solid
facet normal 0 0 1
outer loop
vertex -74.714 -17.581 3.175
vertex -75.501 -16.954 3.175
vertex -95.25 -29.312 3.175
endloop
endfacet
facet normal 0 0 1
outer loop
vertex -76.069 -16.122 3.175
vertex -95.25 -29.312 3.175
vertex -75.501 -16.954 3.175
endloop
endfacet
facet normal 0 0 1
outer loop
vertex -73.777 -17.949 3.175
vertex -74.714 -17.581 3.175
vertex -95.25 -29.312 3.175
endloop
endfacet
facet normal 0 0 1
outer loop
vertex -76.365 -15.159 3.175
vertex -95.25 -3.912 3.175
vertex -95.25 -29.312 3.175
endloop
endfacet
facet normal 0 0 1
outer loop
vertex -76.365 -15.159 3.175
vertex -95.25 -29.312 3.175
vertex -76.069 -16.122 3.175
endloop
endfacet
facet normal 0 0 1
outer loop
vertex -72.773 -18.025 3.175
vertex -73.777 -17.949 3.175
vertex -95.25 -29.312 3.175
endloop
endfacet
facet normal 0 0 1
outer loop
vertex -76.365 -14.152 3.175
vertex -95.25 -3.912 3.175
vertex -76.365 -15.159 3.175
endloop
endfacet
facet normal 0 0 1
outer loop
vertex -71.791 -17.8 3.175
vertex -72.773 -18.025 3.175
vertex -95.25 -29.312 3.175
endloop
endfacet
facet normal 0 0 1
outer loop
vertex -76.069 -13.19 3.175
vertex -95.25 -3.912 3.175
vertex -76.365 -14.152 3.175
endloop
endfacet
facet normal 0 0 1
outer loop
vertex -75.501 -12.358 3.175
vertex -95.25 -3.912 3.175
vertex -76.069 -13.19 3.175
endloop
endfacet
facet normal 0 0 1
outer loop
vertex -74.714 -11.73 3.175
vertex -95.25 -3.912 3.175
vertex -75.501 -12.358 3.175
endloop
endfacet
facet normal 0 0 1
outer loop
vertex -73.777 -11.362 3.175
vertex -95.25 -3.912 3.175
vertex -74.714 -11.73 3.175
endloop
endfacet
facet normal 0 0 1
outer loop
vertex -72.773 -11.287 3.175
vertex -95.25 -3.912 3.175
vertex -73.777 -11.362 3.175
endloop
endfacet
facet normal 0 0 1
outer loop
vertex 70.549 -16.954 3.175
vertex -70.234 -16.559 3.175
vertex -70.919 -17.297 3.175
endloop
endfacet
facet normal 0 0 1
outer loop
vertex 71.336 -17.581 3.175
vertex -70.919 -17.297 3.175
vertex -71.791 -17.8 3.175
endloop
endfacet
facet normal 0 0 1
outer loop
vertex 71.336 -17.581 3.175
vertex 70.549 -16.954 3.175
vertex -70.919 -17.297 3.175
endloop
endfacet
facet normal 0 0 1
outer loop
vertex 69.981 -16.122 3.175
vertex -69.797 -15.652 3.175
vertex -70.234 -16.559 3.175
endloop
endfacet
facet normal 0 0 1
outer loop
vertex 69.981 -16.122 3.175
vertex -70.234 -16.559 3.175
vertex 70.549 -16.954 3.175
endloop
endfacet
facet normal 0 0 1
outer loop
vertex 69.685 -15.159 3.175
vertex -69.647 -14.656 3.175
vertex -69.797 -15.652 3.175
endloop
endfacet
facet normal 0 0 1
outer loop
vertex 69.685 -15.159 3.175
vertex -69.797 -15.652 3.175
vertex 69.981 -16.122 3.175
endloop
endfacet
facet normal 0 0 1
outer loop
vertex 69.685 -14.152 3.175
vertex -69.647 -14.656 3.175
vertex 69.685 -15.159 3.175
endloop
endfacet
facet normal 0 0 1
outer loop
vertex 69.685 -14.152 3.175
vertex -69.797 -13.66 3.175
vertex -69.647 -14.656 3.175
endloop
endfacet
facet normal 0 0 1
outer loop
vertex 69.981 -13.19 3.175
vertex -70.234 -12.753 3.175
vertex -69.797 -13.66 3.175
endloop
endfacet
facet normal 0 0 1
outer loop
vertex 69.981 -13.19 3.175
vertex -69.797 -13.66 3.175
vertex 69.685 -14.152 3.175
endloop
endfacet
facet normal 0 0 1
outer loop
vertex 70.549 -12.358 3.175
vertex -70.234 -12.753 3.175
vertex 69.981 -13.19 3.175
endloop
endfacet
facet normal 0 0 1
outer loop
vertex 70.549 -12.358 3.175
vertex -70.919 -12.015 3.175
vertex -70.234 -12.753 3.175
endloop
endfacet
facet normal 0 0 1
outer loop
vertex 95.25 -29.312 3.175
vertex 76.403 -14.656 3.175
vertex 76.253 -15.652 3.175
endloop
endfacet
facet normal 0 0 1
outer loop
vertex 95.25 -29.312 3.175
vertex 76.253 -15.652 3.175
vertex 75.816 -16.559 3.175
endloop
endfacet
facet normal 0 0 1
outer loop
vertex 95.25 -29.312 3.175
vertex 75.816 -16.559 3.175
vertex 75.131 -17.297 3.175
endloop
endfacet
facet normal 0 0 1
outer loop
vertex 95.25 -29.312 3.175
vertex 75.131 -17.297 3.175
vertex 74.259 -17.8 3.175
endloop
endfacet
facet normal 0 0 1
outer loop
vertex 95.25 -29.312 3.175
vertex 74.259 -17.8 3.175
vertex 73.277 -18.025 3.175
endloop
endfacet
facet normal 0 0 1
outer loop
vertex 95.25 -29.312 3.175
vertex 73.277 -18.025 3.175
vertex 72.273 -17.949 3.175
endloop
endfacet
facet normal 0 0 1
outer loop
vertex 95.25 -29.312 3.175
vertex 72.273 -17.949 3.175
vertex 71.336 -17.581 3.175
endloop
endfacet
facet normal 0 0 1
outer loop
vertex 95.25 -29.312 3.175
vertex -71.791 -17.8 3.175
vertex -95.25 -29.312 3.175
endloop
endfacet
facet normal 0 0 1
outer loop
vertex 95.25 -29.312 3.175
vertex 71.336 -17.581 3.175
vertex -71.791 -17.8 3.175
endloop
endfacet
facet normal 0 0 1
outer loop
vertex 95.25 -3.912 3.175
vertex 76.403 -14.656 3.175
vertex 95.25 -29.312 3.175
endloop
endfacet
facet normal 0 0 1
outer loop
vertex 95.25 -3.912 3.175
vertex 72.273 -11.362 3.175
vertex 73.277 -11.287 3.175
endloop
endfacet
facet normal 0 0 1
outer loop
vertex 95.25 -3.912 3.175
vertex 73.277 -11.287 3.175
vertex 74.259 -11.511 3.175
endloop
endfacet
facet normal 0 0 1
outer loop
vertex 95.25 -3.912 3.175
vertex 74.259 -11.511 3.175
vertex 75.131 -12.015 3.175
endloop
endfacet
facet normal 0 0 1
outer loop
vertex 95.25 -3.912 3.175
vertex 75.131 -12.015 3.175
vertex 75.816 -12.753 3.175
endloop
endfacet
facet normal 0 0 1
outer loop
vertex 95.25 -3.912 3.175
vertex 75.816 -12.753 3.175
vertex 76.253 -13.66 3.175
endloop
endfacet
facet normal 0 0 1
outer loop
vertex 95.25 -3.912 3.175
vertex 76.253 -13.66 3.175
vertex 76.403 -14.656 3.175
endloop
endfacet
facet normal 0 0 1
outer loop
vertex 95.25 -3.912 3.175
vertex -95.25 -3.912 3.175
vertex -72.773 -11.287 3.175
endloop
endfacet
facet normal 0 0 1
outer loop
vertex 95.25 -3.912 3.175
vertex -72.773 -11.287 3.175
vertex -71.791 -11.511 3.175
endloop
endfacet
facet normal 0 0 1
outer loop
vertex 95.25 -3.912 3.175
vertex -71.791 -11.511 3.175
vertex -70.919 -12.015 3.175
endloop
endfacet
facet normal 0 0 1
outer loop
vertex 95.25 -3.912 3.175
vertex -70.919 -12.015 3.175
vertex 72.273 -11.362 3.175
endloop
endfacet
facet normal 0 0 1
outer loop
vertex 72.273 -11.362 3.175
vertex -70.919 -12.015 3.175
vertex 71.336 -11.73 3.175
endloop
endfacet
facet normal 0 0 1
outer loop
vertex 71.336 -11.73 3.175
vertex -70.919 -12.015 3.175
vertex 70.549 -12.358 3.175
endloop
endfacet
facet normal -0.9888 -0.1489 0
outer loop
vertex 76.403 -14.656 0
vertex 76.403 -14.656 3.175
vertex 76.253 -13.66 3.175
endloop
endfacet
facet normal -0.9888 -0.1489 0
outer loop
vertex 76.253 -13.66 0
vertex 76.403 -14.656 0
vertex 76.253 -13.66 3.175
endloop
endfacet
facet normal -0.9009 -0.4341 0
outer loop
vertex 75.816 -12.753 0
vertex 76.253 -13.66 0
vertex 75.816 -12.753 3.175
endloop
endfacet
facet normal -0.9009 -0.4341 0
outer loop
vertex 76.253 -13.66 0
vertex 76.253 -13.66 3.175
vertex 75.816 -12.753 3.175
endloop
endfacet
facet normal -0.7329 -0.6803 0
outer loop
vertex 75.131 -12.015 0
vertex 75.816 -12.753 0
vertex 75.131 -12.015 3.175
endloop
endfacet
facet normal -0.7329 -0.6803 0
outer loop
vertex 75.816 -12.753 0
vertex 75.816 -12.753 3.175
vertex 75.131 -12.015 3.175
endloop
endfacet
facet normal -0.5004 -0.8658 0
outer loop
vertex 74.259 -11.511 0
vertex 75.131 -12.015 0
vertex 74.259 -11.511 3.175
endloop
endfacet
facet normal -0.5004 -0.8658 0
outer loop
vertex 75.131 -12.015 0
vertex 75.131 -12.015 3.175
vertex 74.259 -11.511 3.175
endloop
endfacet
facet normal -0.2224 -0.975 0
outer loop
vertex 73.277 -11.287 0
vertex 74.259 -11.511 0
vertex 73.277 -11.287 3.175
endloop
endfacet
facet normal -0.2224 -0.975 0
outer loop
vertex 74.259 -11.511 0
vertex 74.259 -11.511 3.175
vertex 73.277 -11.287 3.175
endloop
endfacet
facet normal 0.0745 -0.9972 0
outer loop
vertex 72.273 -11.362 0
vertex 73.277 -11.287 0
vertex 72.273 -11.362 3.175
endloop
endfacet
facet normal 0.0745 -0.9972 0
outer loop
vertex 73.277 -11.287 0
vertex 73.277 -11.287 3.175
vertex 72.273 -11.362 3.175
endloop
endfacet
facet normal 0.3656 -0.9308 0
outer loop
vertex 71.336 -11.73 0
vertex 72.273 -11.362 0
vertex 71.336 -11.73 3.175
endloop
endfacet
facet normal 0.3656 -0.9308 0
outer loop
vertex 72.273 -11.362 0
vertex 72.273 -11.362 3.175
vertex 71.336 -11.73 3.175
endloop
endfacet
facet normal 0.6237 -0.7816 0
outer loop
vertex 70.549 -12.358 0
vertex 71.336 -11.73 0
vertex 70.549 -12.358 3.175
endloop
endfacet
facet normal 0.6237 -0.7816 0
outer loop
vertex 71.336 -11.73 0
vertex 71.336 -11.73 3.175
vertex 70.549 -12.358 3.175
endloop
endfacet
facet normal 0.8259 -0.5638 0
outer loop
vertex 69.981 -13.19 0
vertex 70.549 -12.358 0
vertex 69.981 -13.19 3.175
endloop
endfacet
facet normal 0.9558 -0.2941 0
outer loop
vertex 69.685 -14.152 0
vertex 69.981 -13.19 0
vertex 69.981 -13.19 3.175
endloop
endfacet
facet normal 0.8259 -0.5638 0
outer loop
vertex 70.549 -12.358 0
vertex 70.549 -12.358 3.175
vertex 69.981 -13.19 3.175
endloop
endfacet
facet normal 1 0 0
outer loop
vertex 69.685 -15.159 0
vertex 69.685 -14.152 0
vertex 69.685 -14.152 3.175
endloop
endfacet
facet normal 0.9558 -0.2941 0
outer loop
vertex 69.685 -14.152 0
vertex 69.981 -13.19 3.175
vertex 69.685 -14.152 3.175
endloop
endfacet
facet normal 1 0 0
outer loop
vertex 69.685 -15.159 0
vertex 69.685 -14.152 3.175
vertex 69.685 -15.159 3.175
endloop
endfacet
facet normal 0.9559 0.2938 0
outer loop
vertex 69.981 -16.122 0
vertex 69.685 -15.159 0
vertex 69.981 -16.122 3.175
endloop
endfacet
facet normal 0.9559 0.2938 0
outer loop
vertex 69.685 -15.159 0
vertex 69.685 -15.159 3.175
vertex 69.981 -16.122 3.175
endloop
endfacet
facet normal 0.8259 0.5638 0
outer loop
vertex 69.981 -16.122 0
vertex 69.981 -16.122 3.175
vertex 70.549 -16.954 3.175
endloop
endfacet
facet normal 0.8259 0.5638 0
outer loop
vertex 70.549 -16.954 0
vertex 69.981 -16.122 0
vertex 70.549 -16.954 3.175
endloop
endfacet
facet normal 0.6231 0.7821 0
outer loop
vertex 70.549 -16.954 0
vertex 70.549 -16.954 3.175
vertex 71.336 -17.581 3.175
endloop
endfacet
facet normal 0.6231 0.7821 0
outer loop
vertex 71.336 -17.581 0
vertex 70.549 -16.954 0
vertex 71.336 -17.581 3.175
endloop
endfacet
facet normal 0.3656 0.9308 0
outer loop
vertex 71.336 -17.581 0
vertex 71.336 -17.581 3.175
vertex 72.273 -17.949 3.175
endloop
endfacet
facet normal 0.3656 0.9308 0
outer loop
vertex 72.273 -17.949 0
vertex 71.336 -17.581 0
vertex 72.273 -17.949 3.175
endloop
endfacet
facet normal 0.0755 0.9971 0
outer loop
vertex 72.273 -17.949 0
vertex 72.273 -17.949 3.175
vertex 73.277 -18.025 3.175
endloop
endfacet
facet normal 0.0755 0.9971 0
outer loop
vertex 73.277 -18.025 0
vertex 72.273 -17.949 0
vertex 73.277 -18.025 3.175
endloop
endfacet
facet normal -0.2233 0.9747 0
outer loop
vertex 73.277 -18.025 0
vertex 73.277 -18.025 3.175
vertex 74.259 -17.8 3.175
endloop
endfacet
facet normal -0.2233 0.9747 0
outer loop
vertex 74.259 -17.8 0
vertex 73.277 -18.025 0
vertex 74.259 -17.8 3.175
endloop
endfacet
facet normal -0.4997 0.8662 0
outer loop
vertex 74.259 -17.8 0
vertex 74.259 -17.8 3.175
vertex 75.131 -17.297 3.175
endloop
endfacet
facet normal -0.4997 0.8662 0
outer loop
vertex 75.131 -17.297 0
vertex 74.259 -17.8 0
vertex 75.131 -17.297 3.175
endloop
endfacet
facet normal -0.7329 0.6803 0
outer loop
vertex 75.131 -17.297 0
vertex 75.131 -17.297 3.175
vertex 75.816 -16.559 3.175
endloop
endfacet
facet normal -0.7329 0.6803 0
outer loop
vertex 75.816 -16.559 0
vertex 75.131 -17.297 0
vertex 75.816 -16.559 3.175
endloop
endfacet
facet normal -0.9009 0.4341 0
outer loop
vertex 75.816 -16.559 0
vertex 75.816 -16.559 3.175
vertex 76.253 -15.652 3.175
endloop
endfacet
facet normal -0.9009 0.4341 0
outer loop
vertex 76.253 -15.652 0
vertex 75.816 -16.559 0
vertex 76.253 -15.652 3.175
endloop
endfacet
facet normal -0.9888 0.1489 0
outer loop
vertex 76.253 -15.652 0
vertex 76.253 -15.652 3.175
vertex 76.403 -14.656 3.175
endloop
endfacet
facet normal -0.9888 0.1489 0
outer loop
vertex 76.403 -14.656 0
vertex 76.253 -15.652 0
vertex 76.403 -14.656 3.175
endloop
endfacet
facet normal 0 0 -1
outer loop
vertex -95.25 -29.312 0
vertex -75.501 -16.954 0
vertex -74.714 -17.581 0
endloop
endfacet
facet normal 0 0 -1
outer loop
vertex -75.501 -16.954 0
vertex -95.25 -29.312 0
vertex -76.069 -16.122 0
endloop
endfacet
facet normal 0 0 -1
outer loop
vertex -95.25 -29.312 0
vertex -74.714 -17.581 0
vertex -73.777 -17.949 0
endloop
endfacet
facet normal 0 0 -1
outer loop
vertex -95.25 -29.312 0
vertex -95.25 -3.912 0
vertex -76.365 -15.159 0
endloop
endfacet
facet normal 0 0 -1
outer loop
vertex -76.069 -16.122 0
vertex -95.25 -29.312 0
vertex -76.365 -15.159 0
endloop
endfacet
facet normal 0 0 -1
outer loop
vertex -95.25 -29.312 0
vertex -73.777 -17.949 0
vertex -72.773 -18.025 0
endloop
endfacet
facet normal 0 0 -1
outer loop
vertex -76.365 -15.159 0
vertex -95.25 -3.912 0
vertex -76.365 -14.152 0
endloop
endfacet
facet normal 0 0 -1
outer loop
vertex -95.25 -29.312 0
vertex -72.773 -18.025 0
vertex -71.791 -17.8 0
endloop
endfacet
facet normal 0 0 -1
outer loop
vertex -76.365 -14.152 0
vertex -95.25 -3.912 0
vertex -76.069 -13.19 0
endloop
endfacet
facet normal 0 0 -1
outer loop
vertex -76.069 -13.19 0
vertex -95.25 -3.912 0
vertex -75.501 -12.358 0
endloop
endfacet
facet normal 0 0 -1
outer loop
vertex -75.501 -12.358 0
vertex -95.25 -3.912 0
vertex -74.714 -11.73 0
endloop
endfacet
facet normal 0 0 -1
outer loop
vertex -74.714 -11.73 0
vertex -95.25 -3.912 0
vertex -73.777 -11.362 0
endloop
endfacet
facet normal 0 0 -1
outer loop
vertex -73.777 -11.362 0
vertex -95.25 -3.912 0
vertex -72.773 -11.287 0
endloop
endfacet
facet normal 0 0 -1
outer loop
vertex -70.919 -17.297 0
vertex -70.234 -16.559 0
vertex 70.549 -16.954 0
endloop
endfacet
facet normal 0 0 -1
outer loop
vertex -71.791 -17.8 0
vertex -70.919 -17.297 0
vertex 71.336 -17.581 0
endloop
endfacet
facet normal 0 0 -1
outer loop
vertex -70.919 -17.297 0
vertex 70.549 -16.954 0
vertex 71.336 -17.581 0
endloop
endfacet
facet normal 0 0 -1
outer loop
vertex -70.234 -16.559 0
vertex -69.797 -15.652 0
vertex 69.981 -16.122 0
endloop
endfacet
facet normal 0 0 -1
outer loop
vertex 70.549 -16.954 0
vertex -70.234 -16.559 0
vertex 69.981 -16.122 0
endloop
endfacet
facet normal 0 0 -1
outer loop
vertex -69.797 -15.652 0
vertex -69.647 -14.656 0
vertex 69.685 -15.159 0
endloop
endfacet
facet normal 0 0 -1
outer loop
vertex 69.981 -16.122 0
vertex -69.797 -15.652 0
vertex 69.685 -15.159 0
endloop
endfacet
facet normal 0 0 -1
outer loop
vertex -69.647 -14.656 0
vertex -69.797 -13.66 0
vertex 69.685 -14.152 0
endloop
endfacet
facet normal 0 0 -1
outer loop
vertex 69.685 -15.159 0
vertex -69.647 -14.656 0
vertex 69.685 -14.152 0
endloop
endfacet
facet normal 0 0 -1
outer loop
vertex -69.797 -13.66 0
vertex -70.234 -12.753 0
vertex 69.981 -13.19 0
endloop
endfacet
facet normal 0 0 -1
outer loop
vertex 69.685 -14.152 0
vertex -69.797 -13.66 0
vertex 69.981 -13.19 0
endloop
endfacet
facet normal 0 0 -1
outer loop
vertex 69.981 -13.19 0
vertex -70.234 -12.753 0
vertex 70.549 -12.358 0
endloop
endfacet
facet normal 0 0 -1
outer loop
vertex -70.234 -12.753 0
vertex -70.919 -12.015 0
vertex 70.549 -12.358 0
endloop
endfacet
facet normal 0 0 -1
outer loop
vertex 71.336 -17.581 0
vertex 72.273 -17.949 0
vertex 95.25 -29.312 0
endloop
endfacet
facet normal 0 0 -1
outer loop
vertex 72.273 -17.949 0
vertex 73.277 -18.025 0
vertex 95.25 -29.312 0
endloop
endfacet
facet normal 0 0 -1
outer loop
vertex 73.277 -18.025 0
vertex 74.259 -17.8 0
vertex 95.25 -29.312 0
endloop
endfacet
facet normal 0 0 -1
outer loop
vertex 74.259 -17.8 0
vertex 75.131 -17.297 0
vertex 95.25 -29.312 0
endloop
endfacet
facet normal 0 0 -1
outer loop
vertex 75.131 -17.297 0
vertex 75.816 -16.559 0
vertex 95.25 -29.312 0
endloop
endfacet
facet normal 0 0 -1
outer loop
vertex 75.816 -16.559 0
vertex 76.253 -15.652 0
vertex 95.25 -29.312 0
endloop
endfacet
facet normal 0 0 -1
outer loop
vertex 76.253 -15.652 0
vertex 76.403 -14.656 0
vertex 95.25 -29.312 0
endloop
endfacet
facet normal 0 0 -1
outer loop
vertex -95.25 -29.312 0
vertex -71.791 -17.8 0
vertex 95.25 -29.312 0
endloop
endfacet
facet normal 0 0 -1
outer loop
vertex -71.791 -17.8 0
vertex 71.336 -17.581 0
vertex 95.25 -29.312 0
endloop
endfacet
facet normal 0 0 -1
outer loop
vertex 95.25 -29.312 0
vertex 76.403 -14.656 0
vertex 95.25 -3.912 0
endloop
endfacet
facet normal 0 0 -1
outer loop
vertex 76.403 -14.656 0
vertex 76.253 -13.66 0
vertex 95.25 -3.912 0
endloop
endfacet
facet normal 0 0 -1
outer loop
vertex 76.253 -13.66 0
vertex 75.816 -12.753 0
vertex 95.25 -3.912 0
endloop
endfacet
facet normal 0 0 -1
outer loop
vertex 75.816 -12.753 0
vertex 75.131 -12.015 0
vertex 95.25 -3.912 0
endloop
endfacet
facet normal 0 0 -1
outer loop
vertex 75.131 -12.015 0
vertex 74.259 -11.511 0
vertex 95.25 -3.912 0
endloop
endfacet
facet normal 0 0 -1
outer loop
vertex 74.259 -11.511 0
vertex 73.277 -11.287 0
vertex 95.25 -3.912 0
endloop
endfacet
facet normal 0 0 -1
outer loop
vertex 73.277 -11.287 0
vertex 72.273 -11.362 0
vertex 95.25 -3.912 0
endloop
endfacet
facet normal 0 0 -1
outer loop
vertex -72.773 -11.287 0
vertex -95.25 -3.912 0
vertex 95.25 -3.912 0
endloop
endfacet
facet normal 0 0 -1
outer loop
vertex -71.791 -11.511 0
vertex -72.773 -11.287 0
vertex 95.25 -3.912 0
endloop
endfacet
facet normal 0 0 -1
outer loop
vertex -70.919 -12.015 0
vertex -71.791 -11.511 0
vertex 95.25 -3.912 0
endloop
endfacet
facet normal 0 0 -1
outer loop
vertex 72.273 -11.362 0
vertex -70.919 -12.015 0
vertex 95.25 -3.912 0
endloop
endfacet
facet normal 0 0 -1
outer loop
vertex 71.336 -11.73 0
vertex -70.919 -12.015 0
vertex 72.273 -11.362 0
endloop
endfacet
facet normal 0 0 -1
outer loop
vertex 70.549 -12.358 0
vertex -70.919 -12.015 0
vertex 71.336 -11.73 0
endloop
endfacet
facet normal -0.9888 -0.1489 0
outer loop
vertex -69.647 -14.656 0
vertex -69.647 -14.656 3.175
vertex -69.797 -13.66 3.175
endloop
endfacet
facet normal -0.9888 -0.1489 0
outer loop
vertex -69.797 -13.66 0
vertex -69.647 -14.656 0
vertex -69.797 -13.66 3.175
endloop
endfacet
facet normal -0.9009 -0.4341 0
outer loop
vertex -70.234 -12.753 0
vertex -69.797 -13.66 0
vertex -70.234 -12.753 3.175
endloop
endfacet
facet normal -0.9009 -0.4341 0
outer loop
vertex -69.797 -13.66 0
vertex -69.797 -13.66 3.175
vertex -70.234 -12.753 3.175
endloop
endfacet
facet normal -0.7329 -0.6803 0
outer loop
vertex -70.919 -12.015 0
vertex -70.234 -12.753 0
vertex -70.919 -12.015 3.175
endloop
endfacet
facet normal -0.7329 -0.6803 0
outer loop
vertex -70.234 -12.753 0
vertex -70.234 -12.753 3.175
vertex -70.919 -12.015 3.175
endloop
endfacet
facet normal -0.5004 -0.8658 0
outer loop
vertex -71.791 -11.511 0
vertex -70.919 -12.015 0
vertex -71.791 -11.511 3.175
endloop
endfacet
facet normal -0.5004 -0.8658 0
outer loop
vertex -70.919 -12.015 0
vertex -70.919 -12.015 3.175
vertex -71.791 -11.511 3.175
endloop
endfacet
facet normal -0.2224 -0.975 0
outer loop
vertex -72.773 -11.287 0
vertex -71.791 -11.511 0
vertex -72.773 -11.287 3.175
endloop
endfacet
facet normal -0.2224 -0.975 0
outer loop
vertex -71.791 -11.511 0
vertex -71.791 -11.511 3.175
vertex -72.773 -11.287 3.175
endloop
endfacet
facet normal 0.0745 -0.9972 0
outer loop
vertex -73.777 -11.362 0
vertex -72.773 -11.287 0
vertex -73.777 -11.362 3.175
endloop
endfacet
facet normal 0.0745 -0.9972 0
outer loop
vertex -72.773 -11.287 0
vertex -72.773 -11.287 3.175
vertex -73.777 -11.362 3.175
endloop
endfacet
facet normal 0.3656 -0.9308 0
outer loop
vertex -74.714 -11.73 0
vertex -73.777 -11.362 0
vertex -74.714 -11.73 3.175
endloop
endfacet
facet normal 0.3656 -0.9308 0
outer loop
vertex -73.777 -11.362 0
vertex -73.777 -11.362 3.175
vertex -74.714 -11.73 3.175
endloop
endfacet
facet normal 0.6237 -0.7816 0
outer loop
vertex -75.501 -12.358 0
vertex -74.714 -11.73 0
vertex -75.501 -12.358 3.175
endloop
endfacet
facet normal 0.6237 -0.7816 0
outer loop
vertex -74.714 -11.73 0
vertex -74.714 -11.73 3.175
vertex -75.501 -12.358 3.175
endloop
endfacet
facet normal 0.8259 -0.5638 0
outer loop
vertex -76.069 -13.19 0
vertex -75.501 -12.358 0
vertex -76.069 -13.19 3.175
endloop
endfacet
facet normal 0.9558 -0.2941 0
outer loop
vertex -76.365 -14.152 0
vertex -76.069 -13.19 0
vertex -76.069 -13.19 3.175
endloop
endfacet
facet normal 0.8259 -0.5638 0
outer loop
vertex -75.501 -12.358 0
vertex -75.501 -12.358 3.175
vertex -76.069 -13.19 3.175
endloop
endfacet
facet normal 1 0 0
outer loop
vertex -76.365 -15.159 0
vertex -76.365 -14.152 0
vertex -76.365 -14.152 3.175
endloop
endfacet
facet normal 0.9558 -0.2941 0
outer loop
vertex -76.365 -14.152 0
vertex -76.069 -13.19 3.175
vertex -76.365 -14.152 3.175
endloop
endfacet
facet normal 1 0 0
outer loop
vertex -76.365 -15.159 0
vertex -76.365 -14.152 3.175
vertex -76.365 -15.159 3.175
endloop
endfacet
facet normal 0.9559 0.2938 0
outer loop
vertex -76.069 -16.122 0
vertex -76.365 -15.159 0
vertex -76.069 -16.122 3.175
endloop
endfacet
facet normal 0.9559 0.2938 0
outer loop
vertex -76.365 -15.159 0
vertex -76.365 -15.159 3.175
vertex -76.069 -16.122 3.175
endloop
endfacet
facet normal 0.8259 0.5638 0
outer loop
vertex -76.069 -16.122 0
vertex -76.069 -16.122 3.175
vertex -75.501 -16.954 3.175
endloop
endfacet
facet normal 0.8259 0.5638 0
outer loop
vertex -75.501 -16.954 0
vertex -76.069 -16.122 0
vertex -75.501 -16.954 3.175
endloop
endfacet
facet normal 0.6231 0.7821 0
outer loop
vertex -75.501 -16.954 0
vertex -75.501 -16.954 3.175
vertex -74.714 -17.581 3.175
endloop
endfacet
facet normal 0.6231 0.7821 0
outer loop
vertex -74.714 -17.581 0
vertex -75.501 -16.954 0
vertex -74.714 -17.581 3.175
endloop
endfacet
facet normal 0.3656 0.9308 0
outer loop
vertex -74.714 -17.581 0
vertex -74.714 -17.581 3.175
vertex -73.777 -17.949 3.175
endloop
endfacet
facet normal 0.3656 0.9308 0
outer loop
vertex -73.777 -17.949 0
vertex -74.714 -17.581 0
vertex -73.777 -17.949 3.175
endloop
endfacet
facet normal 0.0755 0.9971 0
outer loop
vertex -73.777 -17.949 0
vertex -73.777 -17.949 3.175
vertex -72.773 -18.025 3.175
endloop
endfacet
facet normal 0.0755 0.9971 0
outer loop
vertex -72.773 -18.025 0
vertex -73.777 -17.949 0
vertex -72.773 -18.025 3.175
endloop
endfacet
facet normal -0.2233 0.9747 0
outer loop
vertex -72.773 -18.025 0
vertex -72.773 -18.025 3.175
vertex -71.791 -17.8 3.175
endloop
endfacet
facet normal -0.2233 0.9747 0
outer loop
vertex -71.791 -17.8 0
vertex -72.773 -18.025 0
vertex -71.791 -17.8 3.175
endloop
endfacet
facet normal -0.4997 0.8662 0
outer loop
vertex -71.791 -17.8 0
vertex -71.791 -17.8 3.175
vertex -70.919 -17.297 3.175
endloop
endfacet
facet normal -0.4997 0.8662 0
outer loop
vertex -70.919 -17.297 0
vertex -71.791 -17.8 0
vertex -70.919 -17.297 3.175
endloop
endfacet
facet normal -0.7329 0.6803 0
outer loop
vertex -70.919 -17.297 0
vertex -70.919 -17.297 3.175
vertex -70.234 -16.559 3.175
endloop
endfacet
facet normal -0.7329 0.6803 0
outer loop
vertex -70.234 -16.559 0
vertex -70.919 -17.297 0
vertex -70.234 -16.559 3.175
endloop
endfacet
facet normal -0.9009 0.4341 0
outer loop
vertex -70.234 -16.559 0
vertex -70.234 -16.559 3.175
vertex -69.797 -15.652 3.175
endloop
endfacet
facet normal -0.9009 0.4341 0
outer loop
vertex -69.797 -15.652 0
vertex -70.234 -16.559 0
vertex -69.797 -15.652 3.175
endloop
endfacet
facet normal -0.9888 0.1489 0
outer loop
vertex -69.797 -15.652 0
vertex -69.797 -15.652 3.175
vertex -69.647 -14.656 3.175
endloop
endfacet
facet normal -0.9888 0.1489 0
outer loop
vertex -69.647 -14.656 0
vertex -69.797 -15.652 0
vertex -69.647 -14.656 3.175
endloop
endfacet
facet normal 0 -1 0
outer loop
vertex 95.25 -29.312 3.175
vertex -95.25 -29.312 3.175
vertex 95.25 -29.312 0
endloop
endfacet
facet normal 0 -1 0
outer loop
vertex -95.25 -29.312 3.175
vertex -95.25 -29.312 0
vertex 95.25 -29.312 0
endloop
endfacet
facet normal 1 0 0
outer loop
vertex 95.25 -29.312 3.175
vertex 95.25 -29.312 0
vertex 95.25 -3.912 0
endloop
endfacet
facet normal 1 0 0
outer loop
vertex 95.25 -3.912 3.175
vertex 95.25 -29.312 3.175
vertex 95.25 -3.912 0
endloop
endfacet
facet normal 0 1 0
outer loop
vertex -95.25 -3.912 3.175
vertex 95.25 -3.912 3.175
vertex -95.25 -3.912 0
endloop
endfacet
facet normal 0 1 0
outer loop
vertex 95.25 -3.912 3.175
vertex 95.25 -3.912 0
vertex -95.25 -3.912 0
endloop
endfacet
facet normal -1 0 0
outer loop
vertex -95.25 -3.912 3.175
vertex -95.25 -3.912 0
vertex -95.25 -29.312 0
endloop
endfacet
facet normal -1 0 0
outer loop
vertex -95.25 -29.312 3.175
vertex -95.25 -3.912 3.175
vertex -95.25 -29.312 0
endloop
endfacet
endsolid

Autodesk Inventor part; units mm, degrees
ref_plane "YZ Plane" through (0, 0, 0) normal (1, 0, 0) x (0, 1, 0)
ref_plane "XZ Plane" through (0, 0, 0) normal (0, 1, 0) x (-1, 0, 0)
ref_plane "XY Plane" through (0, 0, 0) normal (0, 0, 1) x (1, 0, 0)
sketch "Sketch1" plane through (0, 0, 0) normal (0, 0, 1) x (1, 0, 0)
  line L0 (-92.075, -25.4) -> (92.075, -25.4)
  line L1 (95.25, -3.9116) -> (-95.25, -3.9116)
  line L2 (-95.25, -3.9116) -> (-95.25, -29.3116)
  line L3 (-95.25, -29.3116) -> (95.25, -29.3116)
  line L4 (95.25, -29.3116) -> (95.25, -3.9116)
  point P0 (0, 0)
  dimension "d5" = 25.4
extrude "Extrusion1" add sketch "Sketch1" along normal blind 3.175
sketch "Sketch2" plane through (0, 0, 3.175) normal (0, 0, 1) x (1, 0, 0)
  arc A0 (82.55, -18.034) -> (82.55, -11.2776) centre (82.55, -14.6558) ccw
  arc A1 (-82.55, -11.2776) -> (-82.55, -18.034) centre (-82.55, -14.6558) ccw
  line L0 (-63.5, -11.2776) -> (-82.55, -11.2776)
  arc A2 (-63.5, -18.034) -> (-63.5, -11.2776) centre (-63.5, -14.6558) ccw
  line L1 (-82.55, -18.034) -> (-63.5, -18.034)
  line L2 (63.5, -18.034) -> (82.55, -18.034)
  arc A3 (63.5, -11.2776) -> (63.5, -18.034) centre (63.5, -14.6558) ccw
  line L3 (82.55, -11.2776) -> (63.5, -11.2776)
  circle A4 centre (73.025, -14.6558) radius 3.3782
  circle A5 centre (-73.025, -14.6558) radius 3.3782
  line L4 (95.25, -3.9116) -> (-95.25, -3.9116) projected
  point P0 (0, 0)
  dimension "d4" = 10.7442
extrude "Extrusion2" cut sketch "Sketch2" against normal through all contours A4 | A5
properties part number "2018 Cube Backstop Mount"
